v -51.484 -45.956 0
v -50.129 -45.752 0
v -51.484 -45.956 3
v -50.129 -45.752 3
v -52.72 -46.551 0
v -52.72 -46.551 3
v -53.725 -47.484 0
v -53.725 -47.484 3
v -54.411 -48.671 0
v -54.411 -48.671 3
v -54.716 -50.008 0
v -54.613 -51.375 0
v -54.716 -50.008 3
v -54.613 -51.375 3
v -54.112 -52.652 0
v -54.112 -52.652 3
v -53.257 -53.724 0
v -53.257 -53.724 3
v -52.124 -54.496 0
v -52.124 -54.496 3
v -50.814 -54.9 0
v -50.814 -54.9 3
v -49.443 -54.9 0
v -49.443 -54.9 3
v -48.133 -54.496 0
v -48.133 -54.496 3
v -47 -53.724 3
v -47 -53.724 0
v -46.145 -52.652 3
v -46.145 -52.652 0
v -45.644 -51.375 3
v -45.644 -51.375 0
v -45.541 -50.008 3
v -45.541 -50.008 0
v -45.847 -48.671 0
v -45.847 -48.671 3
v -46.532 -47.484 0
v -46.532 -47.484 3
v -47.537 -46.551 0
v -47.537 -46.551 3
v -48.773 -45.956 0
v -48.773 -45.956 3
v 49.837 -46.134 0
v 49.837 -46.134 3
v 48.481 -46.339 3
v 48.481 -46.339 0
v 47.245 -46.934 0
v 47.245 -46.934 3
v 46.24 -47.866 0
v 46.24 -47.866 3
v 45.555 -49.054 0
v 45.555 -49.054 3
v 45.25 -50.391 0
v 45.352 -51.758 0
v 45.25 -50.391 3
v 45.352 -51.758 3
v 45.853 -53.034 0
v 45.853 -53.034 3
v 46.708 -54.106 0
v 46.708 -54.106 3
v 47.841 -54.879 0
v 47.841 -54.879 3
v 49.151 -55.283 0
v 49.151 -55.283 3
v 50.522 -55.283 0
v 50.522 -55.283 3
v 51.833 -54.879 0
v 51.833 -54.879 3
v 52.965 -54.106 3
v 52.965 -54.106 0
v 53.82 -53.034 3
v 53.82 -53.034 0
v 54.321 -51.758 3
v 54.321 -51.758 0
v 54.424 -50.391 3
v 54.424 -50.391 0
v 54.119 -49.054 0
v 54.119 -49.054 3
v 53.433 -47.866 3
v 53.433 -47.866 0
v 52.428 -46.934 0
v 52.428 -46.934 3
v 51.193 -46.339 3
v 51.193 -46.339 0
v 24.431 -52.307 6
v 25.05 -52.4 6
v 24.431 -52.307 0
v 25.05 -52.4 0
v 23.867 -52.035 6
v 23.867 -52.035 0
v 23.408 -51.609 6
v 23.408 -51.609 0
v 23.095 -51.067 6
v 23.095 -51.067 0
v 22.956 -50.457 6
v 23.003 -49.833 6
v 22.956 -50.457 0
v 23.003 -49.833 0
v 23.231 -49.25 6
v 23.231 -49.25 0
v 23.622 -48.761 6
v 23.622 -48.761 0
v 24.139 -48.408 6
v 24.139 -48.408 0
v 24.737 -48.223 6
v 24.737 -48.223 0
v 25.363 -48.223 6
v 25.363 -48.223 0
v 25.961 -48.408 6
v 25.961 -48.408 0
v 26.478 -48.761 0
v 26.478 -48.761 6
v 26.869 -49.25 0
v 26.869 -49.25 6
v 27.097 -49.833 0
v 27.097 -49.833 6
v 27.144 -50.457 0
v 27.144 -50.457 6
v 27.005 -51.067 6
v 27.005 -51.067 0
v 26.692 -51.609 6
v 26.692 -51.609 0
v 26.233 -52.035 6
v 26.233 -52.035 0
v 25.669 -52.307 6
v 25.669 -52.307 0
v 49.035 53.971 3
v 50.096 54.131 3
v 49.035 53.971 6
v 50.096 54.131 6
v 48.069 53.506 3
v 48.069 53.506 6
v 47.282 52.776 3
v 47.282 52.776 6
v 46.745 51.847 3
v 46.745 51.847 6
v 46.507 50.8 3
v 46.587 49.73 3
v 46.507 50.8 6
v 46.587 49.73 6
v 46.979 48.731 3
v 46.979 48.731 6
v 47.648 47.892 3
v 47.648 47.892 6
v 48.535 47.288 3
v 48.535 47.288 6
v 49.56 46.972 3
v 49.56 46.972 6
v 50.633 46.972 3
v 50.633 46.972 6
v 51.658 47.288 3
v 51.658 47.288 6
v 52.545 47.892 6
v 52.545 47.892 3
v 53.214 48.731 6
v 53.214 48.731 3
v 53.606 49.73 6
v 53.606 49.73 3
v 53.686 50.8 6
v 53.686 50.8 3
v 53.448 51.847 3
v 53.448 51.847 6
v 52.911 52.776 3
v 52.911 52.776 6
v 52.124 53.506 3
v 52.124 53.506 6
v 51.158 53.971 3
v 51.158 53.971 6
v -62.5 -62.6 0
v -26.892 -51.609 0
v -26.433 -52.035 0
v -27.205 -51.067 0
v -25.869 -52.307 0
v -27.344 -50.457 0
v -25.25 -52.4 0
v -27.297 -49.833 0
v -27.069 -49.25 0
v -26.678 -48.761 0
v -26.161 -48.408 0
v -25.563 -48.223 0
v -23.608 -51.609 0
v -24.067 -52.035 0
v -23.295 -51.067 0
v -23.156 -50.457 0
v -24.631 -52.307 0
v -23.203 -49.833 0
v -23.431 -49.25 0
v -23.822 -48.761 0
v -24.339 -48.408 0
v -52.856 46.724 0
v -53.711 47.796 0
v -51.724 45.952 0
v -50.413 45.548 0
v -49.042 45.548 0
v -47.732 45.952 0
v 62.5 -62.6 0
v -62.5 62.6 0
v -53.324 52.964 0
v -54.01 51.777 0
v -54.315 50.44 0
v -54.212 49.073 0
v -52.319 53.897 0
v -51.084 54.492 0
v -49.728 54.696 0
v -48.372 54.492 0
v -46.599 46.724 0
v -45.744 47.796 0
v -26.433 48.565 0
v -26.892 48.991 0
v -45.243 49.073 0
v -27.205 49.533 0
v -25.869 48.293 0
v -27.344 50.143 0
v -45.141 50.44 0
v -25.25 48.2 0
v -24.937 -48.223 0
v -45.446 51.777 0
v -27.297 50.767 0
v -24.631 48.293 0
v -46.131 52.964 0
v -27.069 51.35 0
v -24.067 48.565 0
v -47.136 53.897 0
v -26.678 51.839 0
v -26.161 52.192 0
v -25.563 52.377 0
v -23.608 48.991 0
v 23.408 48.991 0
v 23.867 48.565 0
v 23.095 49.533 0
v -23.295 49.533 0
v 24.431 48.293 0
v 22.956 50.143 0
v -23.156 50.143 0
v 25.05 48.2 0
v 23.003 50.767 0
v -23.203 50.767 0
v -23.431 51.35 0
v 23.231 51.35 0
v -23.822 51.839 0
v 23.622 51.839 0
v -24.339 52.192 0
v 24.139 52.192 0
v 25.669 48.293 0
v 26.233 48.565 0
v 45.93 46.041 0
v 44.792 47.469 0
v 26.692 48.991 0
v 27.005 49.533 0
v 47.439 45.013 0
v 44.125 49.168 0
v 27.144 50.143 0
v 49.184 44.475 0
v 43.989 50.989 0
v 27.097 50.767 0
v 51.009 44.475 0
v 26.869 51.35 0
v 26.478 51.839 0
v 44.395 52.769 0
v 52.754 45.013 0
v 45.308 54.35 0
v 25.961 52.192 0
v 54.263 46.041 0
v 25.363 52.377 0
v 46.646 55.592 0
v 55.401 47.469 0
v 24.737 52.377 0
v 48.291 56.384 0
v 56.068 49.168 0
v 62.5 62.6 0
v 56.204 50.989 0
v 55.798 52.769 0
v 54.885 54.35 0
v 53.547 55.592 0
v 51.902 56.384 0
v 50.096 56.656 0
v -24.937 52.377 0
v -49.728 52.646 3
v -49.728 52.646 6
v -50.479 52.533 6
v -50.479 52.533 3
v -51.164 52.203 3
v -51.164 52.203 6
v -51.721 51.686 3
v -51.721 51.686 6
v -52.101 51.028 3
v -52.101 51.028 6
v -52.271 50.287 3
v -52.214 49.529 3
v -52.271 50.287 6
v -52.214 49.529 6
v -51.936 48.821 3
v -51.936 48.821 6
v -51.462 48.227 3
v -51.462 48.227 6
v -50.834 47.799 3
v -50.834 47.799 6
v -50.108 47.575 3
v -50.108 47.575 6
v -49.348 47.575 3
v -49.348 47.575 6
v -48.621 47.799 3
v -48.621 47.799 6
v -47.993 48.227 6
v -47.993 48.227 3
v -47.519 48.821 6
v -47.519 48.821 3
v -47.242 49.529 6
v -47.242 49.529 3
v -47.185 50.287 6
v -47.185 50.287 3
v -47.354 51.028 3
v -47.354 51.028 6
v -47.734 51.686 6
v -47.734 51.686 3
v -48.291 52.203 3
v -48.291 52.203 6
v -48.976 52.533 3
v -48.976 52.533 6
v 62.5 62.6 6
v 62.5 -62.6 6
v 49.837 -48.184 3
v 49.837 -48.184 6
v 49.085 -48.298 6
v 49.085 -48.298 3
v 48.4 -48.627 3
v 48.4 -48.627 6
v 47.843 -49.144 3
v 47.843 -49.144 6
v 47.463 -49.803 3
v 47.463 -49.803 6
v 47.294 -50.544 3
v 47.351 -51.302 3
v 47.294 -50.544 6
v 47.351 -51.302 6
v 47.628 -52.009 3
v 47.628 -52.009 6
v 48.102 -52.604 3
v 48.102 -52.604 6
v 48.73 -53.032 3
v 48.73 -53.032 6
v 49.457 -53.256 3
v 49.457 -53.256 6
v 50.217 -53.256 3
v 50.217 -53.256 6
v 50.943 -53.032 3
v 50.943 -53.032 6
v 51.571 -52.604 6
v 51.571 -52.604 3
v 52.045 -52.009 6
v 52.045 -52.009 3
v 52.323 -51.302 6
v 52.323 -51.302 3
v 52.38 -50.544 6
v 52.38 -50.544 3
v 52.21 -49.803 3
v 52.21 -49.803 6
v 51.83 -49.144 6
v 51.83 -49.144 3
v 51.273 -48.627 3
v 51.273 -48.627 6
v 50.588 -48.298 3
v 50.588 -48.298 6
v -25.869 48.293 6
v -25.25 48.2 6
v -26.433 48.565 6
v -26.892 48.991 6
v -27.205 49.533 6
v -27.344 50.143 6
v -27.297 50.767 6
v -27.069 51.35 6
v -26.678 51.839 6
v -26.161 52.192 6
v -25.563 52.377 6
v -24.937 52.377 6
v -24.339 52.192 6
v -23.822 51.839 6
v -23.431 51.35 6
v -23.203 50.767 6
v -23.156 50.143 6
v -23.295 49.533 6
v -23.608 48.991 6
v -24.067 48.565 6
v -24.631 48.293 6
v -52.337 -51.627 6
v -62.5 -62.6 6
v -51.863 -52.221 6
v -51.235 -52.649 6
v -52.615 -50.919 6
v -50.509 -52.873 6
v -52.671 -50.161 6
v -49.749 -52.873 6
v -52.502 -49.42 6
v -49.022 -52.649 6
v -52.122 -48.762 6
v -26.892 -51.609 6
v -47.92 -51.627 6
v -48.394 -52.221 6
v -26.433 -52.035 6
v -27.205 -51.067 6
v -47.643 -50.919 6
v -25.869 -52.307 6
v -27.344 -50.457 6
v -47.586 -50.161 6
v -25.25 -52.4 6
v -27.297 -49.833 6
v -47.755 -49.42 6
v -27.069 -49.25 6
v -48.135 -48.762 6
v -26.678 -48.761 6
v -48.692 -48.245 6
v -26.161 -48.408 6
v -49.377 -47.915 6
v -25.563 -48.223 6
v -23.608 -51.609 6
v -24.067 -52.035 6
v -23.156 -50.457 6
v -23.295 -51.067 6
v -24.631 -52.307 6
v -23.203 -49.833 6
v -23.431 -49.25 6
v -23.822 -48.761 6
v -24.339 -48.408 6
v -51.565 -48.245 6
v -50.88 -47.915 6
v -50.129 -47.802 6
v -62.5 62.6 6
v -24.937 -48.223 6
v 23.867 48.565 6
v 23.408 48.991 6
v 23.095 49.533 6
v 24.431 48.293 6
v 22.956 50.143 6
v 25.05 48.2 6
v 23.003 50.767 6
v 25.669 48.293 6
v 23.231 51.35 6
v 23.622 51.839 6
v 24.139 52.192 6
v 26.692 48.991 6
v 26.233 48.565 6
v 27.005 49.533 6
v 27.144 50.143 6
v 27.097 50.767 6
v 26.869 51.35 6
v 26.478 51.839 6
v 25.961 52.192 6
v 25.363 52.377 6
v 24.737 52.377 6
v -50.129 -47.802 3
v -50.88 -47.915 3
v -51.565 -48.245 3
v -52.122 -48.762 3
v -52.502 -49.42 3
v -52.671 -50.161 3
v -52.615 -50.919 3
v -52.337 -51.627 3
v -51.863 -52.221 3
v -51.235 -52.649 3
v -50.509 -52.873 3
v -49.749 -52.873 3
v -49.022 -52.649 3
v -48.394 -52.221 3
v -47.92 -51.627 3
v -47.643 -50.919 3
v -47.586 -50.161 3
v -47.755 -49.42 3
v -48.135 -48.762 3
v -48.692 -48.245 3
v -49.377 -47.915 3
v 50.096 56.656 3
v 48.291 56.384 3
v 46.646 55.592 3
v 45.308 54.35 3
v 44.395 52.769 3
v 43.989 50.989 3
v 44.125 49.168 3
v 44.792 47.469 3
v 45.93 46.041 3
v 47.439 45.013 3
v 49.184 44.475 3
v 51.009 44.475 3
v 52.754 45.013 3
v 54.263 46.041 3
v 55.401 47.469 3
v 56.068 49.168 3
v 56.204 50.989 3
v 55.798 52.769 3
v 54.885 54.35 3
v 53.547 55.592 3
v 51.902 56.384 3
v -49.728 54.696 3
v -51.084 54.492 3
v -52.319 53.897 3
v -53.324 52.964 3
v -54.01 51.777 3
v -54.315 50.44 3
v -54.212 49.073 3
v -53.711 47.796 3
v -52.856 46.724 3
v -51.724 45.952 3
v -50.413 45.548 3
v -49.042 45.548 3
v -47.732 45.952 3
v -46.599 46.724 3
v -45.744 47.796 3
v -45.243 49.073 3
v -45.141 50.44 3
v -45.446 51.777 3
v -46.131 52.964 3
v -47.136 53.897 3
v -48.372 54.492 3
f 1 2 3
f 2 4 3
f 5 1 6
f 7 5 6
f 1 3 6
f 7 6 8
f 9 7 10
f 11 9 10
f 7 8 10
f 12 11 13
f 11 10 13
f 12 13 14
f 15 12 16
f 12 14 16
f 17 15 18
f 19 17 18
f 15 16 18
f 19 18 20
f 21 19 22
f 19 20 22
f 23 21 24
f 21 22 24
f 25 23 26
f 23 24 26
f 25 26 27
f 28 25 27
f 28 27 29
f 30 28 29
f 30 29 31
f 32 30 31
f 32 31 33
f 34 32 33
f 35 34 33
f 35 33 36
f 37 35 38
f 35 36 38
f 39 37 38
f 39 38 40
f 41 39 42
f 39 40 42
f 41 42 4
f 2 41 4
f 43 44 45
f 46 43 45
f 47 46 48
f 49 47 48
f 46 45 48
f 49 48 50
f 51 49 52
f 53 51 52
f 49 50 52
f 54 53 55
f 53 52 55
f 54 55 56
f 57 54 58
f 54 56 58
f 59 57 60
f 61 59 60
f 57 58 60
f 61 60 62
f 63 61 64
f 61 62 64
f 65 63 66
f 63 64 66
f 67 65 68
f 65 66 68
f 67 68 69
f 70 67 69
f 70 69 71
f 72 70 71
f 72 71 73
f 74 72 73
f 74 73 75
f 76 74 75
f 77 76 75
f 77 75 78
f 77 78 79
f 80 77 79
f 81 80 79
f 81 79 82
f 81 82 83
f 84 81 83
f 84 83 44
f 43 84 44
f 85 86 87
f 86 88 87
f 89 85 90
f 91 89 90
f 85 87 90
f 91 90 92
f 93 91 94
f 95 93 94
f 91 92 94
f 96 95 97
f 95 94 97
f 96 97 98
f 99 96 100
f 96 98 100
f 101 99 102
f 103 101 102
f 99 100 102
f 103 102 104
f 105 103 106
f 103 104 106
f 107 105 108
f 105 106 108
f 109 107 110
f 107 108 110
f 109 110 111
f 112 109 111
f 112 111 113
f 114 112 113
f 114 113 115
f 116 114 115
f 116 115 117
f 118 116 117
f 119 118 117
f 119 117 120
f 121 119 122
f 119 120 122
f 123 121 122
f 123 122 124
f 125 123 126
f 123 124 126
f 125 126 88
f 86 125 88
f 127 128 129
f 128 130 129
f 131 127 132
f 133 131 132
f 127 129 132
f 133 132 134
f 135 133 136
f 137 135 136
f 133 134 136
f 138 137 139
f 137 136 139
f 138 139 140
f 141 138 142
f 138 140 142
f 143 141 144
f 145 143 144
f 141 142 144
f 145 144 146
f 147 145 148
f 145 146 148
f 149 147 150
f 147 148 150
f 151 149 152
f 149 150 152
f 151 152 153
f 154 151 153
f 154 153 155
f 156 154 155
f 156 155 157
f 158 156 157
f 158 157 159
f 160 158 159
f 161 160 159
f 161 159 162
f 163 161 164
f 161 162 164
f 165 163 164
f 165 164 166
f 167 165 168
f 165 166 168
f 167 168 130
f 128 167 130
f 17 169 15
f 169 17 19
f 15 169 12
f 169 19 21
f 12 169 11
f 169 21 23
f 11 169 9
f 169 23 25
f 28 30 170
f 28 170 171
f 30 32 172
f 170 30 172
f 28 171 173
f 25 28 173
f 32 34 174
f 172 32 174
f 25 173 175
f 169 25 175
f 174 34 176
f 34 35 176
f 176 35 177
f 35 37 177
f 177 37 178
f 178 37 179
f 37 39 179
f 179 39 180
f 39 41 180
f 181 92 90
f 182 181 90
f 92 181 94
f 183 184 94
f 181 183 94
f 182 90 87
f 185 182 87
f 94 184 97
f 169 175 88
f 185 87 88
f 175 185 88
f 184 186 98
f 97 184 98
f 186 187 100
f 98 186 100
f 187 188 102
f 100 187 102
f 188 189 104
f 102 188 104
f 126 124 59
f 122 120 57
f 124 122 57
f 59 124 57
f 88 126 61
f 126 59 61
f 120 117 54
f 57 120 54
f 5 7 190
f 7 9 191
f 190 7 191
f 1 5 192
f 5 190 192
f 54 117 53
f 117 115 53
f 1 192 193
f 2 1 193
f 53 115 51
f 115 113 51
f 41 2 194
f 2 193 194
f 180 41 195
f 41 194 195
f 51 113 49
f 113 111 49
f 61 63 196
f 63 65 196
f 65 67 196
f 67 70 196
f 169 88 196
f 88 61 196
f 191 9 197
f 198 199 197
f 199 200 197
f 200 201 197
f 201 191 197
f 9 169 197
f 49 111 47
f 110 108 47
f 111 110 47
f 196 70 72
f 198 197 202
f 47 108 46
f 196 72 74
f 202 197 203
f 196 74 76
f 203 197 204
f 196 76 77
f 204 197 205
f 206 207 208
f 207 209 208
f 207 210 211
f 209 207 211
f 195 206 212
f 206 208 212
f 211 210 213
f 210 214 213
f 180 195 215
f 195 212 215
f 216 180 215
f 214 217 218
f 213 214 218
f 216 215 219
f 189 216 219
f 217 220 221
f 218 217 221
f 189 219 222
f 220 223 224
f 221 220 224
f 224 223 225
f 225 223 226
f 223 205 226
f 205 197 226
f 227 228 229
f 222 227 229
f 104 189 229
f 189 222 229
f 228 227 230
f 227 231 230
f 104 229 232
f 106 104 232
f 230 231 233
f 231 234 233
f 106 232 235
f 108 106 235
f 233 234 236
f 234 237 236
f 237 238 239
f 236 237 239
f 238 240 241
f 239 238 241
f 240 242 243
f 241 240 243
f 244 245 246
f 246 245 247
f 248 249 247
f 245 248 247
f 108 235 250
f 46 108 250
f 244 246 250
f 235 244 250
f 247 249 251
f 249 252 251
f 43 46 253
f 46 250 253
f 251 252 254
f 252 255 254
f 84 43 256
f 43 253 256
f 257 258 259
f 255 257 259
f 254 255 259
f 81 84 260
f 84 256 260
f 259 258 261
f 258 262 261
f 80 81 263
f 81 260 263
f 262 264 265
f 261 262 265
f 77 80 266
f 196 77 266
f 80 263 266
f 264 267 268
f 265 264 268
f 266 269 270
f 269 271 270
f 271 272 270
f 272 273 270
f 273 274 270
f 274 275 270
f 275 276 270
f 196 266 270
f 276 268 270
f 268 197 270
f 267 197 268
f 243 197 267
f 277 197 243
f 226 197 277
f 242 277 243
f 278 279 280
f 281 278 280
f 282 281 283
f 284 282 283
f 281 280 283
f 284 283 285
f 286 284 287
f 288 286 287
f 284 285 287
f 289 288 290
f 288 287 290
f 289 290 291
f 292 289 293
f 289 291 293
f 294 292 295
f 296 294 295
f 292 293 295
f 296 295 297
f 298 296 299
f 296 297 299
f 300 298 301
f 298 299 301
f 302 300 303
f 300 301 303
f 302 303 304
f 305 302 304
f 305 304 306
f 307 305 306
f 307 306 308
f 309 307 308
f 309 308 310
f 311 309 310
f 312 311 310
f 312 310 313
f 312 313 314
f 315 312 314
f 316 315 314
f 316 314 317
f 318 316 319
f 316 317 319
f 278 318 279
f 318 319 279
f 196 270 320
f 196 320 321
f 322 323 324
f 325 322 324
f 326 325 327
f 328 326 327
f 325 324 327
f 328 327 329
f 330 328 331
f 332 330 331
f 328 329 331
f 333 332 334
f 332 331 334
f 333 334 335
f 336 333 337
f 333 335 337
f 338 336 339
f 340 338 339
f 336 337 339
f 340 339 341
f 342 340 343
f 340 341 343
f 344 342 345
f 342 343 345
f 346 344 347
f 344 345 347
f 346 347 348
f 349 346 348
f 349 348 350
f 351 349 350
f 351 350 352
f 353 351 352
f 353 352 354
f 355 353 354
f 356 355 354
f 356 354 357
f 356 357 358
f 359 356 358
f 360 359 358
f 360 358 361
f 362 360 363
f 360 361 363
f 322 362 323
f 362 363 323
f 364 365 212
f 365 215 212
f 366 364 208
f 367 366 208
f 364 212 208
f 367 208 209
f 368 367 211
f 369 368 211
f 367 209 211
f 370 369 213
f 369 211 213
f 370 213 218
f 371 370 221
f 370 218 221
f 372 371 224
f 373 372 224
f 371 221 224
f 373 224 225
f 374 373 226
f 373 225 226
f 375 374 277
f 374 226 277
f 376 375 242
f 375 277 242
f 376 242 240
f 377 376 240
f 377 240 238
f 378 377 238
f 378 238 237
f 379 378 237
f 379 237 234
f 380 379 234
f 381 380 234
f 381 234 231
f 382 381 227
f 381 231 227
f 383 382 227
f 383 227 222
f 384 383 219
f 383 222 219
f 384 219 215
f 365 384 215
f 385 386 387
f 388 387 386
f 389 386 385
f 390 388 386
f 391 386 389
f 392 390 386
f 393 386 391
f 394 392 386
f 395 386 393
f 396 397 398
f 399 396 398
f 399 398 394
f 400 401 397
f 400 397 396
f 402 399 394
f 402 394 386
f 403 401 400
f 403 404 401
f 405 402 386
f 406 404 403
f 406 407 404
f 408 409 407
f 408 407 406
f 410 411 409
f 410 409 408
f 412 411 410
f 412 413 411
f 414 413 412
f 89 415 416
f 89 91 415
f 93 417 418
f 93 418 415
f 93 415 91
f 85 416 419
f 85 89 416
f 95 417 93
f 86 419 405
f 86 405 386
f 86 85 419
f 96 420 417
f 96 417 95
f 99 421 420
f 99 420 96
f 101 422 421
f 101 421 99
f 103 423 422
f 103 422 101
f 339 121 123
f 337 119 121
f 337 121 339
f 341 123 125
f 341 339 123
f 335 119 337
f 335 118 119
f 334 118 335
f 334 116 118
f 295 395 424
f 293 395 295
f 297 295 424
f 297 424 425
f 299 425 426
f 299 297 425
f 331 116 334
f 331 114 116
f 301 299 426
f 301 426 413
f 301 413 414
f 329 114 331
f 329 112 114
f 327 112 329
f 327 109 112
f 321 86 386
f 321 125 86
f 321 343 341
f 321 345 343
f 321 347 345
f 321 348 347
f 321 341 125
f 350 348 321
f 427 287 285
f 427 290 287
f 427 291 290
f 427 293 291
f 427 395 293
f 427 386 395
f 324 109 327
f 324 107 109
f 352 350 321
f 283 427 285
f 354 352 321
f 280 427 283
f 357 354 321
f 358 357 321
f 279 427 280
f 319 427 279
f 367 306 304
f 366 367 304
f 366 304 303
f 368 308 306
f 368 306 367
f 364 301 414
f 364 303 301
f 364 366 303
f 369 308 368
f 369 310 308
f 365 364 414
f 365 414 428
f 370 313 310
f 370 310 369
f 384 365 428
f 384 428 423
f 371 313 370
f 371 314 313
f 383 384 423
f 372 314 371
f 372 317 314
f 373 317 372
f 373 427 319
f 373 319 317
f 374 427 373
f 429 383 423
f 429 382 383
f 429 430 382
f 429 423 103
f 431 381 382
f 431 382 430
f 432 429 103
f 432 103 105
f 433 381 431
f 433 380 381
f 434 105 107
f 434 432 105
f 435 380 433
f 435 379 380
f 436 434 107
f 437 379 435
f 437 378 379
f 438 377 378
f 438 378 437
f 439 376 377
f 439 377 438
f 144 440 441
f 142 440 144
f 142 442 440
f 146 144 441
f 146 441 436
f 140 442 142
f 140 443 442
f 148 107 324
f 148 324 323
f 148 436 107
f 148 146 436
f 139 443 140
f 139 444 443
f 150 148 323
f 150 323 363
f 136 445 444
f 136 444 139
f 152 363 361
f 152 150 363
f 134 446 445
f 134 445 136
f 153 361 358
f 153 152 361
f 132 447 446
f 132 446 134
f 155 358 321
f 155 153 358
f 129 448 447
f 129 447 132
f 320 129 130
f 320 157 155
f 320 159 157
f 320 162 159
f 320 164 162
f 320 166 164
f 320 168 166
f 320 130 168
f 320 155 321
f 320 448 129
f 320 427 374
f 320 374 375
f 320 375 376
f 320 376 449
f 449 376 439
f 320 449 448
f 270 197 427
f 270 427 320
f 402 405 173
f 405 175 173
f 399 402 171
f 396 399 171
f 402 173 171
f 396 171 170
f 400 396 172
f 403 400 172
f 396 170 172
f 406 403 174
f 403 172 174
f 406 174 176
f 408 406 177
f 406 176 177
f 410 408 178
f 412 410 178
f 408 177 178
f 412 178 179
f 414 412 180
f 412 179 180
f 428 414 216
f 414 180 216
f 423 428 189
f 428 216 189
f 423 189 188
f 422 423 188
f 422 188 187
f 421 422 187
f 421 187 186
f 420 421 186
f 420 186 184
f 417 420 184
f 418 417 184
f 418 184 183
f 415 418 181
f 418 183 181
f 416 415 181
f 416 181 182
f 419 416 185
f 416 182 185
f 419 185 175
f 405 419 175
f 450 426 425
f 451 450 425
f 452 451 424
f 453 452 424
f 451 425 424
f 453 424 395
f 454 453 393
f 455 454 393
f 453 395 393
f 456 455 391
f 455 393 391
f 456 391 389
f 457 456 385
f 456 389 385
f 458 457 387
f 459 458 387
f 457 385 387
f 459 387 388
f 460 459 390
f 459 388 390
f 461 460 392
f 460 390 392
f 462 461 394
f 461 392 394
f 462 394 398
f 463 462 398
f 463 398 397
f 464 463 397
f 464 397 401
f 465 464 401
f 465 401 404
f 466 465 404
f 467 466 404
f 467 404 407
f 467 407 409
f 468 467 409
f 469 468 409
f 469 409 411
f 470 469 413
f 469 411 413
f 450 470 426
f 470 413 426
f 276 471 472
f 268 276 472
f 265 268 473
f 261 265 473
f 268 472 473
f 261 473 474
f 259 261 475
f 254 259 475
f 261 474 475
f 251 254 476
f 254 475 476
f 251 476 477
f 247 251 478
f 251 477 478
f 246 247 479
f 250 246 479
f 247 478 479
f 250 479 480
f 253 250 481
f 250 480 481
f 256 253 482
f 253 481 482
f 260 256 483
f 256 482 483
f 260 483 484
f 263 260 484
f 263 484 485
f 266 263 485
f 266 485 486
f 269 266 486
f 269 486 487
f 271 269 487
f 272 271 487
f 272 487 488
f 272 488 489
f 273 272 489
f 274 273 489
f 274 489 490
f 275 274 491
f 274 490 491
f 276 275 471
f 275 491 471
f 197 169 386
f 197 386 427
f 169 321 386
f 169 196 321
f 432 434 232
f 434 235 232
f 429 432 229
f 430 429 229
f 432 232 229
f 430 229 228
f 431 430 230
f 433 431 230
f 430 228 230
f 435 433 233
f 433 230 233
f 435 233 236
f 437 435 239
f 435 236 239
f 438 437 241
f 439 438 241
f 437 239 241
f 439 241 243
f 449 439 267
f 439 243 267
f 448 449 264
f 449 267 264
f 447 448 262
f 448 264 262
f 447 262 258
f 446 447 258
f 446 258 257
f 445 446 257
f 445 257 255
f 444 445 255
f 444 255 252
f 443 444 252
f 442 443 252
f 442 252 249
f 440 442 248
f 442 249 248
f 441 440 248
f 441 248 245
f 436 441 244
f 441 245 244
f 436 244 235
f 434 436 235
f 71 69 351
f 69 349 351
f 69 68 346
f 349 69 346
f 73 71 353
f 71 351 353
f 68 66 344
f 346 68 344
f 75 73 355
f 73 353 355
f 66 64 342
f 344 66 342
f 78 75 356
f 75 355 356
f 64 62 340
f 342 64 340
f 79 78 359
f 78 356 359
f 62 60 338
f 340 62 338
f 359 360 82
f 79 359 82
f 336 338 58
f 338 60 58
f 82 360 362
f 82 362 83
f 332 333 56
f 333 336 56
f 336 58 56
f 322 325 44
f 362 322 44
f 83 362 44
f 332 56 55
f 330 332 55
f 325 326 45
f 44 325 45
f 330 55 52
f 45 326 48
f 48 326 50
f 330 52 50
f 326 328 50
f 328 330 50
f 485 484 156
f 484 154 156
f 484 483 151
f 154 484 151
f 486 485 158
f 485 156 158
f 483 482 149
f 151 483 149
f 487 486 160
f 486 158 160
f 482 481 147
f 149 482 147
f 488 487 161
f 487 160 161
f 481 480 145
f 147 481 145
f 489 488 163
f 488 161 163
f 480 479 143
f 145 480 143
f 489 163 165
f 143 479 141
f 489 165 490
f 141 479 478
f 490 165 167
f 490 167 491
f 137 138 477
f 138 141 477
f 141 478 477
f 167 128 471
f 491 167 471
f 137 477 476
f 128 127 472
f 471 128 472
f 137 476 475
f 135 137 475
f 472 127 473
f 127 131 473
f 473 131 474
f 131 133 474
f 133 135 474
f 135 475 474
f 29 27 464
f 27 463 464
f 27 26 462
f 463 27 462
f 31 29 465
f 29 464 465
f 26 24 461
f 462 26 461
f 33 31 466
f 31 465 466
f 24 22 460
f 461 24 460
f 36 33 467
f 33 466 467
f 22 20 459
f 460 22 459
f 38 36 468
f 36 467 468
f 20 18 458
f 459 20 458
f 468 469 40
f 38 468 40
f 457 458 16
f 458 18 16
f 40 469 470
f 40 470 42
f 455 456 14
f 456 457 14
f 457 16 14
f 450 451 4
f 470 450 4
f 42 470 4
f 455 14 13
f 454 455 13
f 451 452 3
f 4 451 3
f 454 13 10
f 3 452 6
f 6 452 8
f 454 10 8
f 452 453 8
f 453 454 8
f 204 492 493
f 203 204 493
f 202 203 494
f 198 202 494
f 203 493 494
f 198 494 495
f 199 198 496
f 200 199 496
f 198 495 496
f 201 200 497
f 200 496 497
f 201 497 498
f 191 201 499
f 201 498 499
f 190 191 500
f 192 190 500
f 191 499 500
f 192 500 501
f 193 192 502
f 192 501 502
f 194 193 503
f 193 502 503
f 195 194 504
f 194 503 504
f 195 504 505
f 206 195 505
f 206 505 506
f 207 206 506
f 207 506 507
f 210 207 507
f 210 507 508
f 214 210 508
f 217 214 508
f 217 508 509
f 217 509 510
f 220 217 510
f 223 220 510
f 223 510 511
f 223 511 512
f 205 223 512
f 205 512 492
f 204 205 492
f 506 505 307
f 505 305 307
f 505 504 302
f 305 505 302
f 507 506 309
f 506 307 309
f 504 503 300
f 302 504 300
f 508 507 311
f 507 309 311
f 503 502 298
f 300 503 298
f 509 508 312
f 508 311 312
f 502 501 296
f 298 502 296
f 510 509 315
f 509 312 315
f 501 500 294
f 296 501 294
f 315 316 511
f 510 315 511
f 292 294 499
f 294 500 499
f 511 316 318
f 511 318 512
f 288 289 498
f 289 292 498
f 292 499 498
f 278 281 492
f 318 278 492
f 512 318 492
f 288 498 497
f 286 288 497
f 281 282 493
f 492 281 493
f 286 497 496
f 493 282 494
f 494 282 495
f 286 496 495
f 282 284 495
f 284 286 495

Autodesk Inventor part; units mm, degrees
ref_plane "YZ Plane" through (0, 0, 0) normal (1, 0, 0) x (0, 1, 0)
ref_plane "XZ Plane" through (0, 0, 0) normal (0, 1, 0) x (-1, 0, 0)
ref_plane "XY Plane" through (0, 0, 0) normal (0, 0, 1) x (1, 0, 0)
ref_plane "Work Plane1" through (0, 0, 0) normal (0, 0, 1) x (1, 0, 0)
sketch "Sketch3" plane through (0, 0, 0) normal (0, 0, 1) x (1, 0, 0)
  line L0 (62.5, 62.6) -> (62.5, -62.6) projected
  line L1 (62.5, -62.6) -> (-62.5, -62.6) projected
  line L2 (62.5, 62.6) -> (62.5, -62.6) projected
  line L3 (-62.5, 62.6) -> (62.5, 62.6) projected
  line L4 (-62.5, -62.6) -> (-62.5, 62.6) projected
  line L5 (62.5, -62.6) -> (-62.5, -62.6) projected
  point P0 (0, 0)
  point P1 (50.2, -50.3)
  point P2 (25.05, -50.3)
  point P3 (-0.1, -50.3)
  point P4 (-25.25, -50.3)
  point P5 (-50.4, -50.3)
  point P6 (-50.4, 50.3)
  point P7 (-25.25, 50.3)
  point P8 (-0.1, 50.3)
  point P9 (25.05, 50.3)
  point P10 (50.2, 50.3)
extrude "Extrusion1" add sketch "Sketch3" along normal blind 6
sketch "Sketch4" plane through (0, 0, 0) normal (0, 0, -1) x (-1, 0, 0)
  point P0 (0, 0)
  point P1 (50.5386, 50.0642)
  point P2 (0.1554, 50.4302)
  point P3 (-50.0965, 50.5314)
hole "Hole1" at (50.0965, 50.5314, 0) direction (0, 0, 1) diameter 7.2 end through all counterbore diameter 12.25 counterbore depth 3
sketch "Sketch5" plane through (0, 0, 0) normal (0, 0, -1) x (-1, 0, 0)
  point P0 (0, 0)
  point P1 (-49.8367, -50.7343)
  point P2 (50.1286, -50.3518)
  point P3 (49.7277, 50.0962)
hole "Hole2" at (49.8367, -50.7343, 0) at (-50.1286, -50.3518, 0) at (-49.7277, 50.0962, 0) direction (0, 0, 1) diameter 5.1 end through all counterbore diameter 9.2 counterbore depth 3
sketch "Sketch6" plane through (0, 0, 6) normal (0, 0, 1) x (1, 0, 0)
  point P0 (0, 0)
  point P1 (-25.25, -50.3)
  point P2 (25.05, -50.3)
  point P3 (25.05, 50.3)
  point P4 (-25.25, 50.3)
hole "Hole3" at (-25.25, -50.3, 6) at (25.05, -50.3, 6) at (25.05, 50.3, 6) at (-25.25, 50.3, 6) direction (0, 0, -1) diameter 4.2 end through all
properties part number "X axis carriage small side_3DPrint"
